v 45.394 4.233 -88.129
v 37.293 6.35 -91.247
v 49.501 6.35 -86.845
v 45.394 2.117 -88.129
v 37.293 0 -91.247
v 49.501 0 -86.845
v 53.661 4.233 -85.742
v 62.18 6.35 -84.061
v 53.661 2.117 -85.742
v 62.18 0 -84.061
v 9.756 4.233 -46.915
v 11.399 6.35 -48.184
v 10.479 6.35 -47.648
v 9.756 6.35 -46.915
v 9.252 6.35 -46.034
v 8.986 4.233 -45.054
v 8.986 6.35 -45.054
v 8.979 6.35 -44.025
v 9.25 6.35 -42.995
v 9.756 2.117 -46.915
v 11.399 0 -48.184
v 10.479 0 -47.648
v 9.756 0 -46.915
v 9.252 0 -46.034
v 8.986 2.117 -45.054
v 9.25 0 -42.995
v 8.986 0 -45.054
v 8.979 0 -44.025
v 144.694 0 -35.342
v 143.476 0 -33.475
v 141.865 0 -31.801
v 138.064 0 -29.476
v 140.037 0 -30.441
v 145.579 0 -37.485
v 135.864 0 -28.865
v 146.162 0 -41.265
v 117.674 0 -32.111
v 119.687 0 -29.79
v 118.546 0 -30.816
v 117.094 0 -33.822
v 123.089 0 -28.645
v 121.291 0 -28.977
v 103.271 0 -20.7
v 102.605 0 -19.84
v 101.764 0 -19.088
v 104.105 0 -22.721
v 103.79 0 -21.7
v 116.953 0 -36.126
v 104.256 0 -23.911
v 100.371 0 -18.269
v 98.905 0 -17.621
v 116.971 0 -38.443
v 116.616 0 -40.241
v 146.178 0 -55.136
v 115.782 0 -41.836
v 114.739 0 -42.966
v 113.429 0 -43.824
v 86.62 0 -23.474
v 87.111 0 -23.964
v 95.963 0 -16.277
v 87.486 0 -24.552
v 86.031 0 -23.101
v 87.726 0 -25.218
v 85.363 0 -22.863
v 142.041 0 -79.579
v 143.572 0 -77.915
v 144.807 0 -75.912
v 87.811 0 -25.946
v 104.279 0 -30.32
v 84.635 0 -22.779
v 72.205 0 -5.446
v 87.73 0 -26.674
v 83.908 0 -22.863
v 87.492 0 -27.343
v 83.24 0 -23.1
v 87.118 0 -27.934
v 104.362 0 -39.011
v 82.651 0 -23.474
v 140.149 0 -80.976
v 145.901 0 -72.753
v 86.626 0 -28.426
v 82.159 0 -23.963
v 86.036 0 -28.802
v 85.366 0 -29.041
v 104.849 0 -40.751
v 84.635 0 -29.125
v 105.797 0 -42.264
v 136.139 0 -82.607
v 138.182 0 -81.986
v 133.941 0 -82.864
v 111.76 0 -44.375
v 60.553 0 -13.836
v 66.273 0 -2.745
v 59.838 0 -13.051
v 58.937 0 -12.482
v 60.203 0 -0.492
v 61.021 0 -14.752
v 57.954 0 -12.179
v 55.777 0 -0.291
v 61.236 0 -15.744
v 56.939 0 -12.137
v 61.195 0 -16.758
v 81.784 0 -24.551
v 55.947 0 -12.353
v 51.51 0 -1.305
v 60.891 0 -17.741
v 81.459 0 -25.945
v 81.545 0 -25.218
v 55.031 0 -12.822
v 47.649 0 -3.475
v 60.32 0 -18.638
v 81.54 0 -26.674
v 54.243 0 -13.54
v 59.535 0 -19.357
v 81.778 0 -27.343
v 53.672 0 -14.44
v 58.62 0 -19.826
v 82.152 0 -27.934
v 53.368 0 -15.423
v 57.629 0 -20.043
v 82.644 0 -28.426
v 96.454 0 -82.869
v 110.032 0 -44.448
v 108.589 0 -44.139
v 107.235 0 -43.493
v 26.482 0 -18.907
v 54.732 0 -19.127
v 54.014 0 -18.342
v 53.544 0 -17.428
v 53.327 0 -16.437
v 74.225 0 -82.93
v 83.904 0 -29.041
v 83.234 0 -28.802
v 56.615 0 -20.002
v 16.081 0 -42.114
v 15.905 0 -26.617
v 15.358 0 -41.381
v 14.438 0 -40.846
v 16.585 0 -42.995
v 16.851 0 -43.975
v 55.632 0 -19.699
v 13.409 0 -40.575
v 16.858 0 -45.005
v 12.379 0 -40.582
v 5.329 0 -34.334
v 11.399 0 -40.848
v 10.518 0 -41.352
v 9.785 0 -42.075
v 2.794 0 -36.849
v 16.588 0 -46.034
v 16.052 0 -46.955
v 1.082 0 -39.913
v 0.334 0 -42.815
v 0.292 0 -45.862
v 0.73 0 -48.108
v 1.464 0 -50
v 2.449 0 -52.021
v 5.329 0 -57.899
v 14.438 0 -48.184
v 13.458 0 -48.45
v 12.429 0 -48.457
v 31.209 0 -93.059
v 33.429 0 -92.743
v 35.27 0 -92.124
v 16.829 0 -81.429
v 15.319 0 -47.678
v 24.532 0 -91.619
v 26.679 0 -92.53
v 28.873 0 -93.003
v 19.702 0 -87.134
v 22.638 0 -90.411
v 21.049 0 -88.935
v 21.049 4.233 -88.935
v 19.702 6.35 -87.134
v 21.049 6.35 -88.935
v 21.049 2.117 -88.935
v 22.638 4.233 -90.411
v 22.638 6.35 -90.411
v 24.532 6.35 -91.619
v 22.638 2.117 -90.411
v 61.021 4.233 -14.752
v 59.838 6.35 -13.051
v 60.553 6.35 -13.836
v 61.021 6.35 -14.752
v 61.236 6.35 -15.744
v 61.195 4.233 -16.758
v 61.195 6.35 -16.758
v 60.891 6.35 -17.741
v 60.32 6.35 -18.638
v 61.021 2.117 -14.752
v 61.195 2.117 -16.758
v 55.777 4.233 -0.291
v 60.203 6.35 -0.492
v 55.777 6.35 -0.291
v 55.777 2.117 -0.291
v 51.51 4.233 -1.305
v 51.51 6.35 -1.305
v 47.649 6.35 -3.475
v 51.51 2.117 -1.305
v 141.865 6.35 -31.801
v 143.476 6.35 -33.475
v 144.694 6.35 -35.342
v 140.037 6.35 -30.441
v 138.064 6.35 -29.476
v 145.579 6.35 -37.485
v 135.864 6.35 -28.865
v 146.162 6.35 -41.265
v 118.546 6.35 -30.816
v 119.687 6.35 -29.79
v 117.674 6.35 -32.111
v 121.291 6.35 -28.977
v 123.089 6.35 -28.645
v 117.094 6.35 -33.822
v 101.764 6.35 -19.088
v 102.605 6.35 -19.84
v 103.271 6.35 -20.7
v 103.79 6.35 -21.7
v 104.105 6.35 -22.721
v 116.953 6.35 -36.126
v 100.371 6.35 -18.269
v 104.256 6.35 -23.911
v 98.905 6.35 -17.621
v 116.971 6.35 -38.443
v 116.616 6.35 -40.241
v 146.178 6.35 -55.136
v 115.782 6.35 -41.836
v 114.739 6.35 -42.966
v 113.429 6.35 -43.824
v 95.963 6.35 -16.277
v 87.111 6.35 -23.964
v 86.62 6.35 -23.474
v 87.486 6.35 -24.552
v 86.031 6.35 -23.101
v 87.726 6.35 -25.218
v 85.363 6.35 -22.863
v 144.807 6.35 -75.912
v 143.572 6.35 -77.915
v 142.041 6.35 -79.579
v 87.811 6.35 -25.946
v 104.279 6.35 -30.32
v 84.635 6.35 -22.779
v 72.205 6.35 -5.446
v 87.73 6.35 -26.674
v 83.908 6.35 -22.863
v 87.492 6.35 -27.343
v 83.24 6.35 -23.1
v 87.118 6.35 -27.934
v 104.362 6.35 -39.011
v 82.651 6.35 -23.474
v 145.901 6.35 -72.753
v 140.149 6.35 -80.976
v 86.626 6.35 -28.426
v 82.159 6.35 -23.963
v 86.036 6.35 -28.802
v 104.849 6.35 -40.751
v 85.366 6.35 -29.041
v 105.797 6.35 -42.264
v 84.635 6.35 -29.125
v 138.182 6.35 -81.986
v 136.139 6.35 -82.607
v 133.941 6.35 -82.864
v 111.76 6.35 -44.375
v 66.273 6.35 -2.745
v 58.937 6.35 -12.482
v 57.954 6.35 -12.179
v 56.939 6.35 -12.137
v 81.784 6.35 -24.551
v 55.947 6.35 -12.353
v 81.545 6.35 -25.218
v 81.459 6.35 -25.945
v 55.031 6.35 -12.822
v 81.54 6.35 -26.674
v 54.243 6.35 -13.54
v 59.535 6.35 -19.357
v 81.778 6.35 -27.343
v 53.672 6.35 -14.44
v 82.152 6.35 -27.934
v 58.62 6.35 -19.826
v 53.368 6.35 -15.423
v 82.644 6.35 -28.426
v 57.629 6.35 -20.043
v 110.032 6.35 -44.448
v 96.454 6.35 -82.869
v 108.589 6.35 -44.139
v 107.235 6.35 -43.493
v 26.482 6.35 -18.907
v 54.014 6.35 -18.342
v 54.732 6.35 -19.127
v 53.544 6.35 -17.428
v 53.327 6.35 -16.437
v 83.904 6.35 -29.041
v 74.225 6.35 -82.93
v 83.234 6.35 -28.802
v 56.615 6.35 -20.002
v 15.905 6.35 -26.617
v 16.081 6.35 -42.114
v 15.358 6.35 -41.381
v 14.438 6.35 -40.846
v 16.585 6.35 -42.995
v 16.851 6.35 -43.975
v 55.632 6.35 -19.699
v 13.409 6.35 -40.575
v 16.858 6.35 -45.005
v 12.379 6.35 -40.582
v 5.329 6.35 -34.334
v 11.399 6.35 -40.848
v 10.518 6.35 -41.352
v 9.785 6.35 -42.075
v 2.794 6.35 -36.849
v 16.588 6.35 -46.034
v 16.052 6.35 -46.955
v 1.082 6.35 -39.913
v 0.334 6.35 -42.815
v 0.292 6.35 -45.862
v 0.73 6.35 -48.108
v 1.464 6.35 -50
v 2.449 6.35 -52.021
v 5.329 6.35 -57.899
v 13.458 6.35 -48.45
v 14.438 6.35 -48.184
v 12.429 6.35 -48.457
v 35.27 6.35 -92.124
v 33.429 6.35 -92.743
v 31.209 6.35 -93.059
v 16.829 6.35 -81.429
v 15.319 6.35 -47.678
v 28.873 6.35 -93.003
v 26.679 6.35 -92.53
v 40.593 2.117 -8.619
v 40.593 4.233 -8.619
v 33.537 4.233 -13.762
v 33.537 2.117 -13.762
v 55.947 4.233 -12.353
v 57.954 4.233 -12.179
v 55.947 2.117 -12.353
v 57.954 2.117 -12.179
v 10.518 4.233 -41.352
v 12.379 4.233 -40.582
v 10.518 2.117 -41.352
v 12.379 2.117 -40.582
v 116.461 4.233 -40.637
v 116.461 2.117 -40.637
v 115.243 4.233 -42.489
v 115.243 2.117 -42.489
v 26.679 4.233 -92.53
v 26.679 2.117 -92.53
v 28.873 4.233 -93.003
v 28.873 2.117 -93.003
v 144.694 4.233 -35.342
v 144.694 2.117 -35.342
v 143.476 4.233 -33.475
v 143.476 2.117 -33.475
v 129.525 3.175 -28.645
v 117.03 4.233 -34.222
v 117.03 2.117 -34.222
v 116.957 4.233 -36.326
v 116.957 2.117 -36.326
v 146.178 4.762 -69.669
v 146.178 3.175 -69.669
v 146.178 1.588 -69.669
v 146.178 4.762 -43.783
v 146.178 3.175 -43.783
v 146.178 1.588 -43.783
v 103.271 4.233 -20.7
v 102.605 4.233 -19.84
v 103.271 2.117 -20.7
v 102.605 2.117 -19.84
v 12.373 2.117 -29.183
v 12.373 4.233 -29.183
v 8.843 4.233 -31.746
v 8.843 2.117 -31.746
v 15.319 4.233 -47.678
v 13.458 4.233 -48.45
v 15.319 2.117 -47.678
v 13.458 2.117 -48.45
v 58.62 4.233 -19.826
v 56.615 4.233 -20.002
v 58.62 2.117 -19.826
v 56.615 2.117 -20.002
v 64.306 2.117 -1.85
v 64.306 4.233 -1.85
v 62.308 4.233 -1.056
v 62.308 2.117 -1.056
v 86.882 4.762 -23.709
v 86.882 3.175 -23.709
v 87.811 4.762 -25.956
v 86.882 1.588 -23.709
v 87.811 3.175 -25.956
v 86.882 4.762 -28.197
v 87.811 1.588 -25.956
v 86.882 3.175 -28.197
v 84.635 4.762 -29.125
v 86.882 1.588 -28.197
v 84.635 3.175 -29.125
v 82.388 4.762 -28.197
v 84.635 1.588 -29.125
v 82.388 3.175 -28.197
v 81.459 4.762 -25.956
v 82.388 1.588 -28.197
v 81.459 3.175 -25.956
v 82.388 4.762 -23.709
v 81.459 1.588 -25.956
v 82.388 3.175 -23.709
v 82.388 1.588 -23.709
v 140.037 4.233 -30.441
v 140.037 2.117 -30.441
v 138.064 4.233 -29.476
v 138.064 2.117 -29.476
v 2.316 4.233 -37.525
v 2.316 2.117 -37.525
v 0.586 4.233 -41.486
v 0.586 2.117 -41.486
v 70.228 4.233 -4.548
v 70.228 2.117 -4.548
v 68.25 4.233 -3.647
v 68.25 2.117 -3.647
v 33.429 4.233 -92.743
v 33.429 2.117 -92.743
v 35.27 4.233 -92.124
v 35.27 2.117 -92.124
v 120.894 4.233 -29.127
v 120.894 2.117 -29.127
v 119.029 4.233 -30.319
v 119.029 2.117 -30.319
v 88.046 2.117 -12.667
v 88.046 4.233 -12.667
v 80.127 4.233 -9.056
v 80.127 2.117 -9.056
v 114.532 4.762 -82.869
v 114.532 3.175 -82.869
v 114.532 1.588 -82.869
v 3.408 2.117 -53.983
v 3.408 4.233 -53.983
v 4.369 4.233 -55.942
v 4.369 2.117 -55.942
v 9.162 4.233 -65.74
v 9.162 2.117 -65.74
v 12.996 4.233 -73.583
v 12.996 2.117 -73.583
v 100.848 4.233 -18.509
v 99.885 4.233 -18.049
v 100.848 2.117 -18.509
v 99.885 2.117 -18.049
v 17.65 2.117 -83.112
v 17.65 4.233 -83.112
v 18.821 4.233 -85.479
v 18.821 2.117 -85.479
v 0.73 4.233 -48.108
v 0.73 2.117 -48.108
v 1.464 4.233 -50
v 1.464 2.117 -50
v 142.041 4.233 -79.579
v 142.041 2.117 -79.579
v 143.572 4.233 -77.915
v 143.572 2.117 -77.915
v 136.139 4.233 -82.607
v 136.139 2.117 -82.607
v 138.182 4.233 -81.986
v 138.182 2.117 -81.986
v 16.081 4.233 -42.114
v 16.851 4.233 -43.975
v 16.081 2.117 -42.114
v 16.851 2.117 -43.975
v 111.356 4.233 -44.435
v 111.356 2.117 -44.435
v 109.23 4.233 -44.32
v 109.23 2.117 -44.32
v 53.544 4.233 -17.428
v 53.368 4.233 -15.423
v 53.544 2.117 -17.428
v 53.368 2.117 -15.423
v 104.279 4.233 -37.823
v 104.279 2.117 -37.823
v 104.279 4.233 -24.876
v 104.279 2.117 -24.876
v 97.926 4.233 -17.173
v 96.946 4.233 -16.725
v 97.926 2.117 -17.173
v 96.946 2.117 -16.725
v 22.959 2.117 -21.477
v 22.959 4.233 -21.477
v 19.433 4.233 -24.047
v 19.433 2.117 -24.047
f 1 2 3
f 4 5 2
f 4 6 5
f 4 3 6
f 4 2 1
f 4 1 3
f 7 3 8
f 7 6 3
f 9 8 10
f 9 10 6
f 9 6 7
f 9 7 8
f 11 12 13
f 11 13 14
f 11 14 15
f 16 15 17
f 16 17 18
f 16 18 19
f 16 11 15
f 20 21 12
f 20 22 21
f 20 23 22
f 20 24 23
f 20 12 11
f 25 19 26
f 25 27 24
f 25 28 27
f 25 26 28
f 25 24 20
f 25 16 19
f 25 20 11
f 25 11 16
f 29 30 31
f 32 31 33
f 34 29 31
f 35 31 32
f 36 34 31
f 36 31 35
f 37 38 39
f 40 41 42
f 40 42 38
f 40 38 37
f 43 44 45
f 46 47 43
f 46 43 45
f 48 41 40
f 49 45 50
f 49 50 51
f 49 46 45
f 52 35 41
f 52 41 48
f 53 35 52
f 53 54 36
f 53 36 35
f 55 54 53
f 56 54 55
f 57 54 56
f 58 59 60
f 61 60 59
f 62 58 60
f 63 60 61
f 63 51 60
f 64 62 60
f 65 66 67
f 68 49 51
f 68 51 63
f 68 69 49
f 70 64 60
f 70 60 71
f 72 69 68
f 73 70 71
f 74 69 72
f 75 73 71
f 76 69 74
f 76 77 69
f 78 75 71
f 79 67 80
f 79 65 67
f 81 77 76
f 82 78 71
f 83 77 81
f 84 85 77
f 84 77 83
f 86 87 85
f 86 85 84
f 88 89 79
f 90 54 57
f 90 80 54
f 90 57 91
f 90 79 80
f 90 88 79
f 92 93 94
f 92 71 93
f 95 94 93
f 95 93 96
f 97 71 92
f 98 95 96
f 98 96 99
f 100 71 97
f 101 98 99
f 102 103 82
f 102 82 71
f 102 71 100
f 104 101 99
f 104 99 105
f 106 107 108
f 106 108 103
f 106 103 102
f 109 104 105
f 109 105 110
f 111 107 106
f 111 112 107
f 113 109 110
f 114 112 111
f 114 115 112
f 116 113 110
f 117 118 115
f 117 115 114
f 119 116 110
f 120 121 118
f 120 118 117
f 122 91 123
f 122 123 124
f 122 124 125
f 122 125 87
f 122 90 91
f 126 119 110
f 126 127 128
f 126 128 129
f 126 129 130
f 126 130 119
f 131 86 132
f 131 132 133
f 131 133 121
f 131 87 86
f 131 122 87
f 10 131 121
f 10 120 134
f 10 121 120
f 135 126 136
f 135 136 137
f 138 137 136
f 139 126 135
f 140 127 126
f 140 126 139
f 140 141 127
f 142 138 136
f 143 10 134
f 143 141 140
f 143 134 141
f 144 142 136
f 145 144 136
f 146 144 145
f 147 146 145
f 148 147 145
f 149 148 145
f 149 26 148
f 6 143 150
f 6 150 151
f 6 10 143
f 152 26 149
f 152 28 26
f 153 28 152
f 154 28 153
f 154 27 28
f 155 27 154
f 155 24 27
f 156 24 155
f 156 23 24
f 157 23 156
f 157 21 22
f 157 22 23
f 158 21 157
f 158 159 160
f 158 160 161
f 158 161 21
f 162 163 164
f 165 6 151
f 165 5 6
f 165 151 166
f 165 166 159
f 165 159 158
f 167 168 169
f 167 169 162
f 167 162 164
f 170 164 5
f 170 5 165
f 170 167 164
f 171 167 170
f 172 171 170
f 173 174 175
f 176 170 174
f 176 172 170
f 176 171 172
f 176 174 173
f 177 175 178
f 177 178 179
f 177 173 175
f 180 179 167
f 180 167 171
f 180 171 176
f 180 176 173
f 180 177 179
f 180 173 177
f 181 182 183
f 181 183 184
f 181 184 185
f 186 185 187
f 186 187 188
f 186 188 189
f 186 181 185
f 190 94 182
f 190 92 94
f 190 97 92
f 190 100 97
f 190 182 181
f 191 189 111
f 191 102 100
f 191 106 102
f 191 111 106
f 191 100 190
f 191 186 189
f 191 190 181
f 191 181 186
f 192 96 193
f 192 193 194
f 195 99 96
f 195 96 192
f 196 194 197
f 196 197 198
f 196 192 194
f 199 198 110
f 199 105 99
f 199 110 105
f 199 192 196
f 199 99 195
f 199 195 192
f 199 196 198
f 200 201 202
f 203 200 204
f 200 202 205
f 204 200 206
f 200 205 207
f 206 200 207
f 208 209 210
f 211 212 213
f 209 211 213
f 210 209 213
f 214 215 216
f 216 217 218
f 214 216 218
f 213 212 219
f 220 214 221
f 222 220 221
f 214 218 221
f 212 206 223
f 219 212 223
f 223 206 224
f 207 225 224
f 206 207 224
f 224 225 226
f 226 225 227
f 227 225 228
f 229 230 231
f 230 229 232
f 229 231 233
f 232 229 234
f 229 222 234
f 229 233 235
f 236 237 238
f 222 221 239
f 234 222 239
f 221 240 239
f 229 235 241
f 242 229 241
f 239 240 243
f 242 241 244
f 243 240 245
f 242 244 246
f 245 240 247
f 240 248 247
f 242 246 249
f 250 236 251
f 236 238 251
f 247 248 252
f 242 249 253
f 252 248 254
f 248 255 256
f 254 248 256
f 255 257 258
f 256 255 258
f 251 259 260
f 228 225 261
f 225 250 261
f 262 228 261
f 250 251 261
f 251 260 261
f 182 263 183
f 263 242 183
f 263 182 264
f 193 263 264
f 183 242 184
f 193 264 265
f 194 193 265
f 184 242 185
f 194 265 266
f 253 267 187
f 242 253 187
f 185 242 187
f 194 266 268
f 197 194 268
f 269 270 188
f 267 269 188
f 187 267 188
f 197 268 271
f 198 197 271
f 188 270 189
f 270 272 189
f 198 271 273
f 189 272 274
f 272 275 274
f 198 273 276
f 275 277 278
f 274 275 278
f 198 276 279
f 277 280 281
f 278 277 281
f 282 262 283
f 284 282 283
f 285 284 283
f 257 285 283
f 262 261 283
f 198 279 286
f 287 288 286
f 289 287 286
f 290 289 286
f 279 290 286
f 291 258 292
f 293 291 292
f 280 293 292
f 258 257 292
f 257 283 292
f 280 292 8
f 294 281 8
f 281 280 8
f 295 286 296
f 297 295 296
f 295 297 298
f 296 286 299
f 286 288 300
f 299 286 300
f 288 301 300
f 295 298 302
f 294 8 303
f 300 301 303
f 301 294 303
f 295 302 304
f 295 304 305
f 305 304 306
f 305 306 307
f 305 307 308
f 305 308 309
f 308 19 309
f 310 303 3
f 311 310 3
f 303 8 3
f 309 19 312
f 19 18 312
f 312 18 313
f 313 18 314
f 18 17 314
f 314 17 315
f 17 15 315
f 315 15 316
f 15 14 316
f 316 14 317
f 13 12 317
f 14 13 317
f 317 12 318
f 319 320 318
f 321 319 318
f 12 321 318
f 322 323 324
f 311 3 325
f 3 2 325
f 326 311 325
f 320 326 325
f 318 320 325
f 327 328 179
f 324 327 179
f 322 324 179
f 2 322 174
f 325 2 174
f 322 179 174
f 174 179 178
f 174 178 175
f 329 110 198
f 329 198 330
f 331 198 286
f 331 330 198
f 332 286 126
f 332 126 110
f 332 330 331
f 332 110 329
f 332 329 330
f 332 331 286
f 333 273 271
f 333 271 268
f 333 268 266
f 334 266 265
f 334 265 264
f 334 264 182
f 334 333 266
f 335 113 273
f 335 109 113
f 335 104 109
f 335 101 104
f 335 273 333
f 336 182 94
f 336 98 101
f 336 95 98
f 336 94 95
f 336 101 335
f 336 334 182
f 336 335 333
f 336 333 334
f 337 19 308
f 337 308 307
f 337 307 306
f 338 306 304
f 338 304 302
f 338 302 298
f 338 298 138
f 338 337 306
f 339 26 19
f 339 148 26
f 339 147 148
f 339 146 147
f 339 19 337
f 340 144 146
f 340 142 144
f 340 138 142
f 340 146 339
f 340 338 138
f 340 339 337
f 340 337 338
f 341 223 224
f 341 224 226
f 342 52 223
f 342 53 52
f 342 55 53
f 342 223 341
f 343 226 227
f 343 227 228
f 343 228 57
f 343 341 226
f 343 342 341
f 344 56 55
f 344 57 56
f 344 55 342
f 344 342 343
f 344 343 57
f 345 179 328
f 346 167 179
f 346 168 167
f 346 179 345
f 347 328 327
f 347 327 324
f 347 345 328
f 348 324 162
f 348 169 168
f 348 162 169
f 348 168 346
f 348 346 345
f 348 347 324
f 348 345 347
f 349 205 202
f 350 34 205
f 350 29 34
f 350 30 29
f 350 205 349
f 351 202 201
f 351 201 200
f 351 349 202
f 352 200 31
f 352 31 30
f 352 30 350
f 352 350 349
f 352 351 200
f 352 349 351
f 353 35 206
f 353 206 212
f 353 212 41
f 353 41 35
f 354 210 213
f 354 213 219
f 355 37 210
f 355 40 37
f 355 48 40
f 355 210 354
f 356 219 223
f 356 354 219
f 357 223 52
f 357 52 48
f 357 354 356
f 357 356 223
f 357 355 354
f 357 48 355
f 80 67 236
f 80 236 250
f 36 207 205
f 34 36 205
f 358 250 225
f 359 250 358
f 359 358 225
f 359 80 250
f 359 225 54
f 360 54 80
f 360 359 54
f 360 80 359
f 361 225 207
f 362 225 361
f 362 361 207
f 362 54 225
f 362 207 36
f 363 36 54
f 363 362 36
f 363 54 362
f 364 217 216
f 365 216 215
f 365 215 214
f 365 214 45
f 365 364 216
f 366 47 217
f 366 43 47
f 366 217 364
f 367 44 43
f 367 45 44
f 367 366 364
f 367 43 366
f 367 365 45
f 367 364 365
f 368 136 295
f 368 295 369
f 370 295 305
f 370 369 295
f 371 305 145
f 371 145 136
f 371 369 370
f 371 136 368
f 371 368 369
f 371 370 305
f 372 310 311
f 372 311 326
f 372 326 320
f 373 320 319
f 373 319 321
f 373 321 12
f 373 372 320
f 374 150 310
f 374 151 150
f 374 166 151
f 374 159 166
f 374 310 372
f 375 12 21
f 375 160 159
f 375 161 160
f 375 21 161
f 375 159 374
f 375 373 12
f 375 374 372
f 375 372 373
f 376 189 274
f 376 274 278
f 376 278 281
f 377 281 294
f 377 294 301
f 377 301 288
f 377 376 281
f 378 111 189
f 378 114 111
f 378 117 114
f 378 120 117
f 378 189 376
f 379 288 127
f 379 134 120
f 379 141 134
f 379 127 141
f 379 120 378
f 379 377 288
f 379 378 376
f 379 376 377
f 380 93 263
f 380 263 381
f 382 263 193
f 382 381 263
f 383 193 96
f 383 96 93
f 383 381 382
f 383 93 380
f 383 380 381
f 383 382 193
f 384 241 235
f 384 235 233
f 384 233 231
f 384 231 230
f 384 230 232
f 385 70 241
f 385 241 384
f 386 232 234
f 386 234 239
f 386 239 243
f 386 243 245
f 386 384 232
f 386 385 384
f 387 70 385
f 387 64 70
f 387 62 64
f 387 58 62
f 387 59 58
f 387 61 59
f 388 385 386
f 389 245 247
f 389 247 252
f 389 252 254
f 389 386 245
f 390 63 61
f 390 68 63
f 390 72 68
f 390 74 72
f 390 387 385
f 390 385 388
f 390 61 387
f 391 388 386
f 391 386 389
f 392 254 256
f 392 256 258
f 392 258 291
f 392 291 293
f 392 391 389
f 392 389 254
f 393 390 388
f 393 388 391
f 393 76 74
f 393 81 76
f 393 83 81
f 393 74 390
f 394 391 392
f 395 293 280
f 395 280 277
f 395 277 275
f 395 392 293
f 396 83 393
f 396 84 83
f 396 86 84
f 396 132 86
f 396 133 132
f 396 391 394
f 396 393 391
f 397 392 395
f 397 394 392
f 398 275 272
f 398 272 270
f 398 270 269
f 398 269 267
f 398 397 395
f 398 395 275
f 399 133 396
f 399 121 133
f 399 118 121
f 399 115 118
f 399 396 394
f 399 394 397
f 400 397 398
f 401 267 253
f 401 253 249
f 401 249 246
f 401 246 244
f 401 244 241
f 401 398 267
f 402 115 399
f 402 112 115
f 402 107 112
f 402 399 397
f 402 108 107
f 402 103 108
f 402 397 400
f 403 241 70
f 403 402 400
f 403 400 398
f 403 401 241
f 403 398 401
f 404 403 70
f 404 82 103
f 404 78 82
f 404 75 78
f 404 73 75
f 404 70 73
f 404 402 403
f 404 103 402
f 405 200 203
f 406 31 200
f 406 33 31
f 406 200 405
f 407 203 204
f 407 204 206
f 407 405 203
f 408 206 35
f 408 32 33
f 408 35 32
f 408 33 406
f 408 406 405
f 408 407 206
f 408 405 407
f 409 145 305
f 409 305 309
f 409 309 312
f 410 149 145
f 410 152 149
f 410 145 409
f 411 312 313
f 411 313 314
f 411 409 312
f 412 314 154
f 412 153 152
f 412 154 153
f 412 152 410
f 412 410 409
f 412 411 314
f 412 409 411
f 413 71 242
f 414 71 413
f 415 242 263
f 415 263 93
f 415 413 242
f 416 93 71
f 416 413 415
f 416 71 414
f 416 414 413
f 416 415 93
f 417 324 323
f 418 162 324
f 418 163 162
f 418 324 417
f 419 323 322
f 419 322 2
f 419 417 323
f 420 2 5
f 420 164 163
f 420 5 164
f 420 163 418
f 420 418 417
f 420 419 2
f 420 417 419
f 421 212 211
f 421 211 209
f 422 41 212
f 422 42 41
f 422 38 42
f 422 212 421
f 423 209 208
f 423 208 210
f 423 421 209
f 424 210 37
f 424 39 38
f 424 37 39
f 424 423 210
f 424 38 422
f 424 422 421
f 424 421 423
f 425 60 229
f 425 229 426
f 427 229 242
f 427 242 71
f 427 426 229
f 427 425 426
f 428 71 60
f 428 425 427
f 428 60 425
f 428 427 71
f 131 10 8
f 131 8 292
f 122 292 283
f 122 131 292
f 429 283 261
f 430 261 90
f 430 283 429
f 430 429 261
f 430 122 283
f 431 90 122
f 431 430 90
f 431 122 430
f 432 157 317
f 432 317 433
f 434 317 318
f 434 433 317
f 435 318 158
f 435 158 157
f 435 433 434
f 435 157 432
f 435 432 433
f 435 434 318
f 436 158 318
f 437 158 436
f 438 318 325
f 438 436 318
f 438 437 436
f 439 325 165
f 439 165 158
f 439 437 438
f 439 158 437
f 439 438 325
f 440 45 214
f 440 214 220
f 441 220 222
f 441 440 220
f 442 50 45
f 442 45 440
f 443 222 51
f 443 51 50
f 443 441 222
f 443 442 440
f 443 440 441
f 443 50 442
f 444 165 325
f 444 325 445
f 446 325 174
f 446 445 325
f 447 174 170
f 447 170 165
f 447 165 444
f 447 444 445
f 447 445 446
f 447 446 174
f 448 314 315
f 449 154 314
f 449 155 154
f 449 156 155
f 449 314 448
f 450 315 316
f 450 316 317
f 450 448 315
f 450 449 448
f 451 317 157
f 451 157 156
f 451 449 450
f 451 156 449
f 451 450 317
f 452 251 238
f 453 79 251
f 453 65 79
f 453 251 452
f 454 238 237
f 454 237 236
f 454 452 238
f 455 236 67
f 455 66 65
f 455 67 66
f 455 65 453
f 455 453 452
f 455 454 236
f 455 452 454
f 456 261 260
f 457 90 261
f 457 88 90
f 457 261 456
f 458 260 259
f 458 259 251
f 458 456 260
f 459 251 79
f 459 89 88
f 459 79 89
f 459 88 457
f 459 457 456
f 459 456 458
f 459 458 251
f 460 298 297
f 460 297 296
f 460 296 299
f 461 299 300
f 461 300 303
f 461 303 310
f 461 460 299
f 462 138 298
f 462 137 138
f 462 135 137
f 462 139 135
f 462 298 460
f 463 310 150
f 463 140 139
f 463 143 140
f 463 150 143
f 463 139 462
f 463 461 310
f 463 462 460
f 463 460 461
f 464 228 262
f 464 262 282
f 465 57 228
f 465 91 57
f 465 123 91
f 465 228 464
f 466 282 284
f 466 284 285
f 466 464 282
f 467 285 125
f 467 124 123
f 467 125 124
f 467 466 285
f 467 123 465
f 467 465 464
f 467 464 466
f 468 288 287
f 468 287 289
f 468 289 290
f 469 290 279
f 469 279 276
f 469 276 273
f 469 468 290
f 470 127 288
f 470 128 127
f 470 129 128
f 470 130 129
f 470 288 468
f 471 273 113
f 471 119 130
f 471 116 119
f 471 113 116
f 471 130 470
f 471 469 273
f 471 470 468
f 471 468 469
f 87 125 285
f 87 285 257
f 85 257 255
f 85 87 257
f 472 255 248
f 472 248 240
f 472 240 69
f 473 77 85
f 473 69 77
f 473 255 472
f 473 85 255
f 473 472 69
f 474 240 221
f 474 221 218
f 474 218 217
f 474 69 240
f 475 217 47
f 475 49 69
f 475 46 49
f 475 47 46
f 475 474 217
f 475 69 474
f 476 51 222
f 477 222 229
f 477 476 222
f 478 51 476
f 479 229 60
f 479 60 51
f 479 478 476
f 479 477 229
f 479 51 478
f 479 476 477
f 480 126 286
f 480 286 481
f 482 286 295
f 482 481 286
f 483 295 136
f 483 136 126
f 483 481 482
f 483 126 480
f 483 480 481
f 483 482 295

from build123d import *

# Parameters (mm, degrees)
BOSS_EXTRUDE1_DEPTH = 6.35


with BuildPart() as part:
    # Imported Profile → Boss-Extrude1 (new body)
    with BuildSketch(Plane(origin=(0, 0, 0), x_dir=(1, 0, 0), z_dir=(0, 1, 0))):
        with BuildLine():
            add(Edge.make_bspline(
                [(47.6487744, 3.4752534), (40.59301, 8.6201504), (33.5374742, 13.7602468), (26.4818876, 18.9072012)],
                knots=[0, 0, 0, 0, 1, 1, 1, 1], degree=3))
            add(Edge.make_bspline(
                [(26.4818876, 18.9072012), (22.9609904, 21.4772494), (19.4332098, 24.0472976), (15.9054292, 26.6173458)],
                knots=[0, 0, 0, 0, 1, 1, 1, 1], degree=3))
            add(Edge.make_bspline(
                [(15.9054292, 26.6173458), (12.3776486, 29.194252), (8.8292178, 31.722949), (5.3289962, 34.3343484)],
                knots=[0, 0, 0, 0, 1, 1, 1, 1], degree=3))
            add(Edge.make_bspline(
                [(5.3289962, 34.3343484), (1.725422, 37.0214906), (-0.1831594, 41.396793), (0.2922778, 45.8616304)],
                knots=[0, 0, 0, 0, 1, 1, 1, 1], degree=3))
            add(Edge.make_bspline(
                [(0.2922778, 45.8616304), (0.5678678, 48.4454454), (1.3533628, 49.775237), (2.4489156, 52.0214352)],
                knots=[0, 0, 0, 0, 1, 1, 1, 1], degree=3))
            add(Edge.make_bspline(
                [(2.4489156, 52.0214352), (3.406648, 53.9851346), (4.3712638, 55.9420014), (5.3289962, 57.898792)],
                knots=[0, 0, 0, 0, 1, 1, 1, 1], degree=3))
            add(Edge.make_bspline(
                [(5.3289962, 57.898792), (9.1599258, 65.7398482), (12.9977896, 73.5809044), (16.8287192, 81.4287932)],
                knots=[0, 0, 0, 0, 1, 1, 1, 1], degree=3))
            add(Edge.make_bspline(
                [(16.8287192, 81.4287932), (17.2627798, 82.3038486), (19.17827, 86.3001322), (19.7019418, 87.1338872)],
                knots=[0, 0, 0, 0, 1, 1, 1, 1], degree=3))
            add(Edge.make_bspline(
                [(19.7019418, 87.1338872), (20.9490564, 89.1182368), (22.464903, 90.5238474), (24.531955, 91.6194002)],
                knots=[0, 0, 0, 0, 1, 1, 1, 1], degree=3))
            add(Edge.make_bspline(
                [(24.531955, 91.6194002), (26.6885928, 92.7563042), (28.769437, 93.2041316), (31.2085736, 93.0594532)],
                knots=[0, 0, 0, 0, 1, 1, 1, 1], degree=3))
            add(Edge.make_bspline(
                [(31.2085736, 93.0594532), (33.8061554, 92.9079422), (34.9912686, 92.2394904), (37.2925594, 91.2472902)],
                knots=[0, 0, 0, 0, 1, 1, 1, 1], degree=3))
            add(Edge.make_bspline(
                [(37.2925594, 91.2472902), (45.3403208, 87.7540028), (53.505227, 85.3975432), (62.179962, 84.0608428)],
                knots=[0, 0, 0, 0, 1, 1, 1, 1], degree=3))
            add(Edge.make_bspline(
                [(62.179962, 84.0608428), (71.9502752, 82.5518796), (78.5372572, 82.8688462), (88.3282714, 82.8688462)],
                knots=[0, 0, 0, 0, 1, 1, 1, 1], degree=3))
            add(Edge.make_bspline(
                [(88.3282714, 82.8688462), (97.0650078, 82.8688462), (105.8017696, 82.8688462), (114.5316734, 82.8688462)],
                knots=[0, 0, 0, 0, 1, 1, 1, 1], degree=3))
            add(Edge.make_bspline(
                [(114.5316734, 82.8688462), (118.8517562, 82.8688462), (123.1719152, 82.8688462), (127.4989576, 82.8688462)],
                knots=[0, 0, 0, 0, 1, 1, 1, 1], degree=3))
            add(Edge.make_bspline(
                [(127.4989576, 82.8688462), (129.648712, 82.8688462), (131.7984664, 82.9378326), (133.941312, 82.8638424)],
                knots=[0, 0, 0, 0, 1, 1, 1, 1], degree=3))
            add(Edge.make_bspline(
                [(133.941312, 82.8638424), (136.2426282, 82.7813432), (138.1925608, 82.1885834), (140.1493768, 80.9758858)],
                knots=[0, 0, 0, 0, 1, 1, 1, 1], degree=3))
            add(Edge.make_bspline(
                [(140.1493768, 80.9758858), (142.2439624, 79.6874454), (143.6978076, 78.1095974), (144.8071272, 75.9116338)],
                knots=[0, 0, 0, 0, 1, 1, 1, 1], degree=3))
            add(Edge.make_bspline(
                [(144.8071272, 75.9116338), (145.8337698, 73.892791), (146.17827, 71.8946492), (146.17827, 69.669152)],
                knots=[0, 0, 0, 0, 1, 1, 1, 1], degree=3))
            add(Edge.make_bspline(
                [(146.17827, 69.669152), (146.17827, 65.3489422), (146.17827, 61.0219506), (146.17827, 56.7017408)],
                knots=[0, 0, 0, 0, 1, 1, 1, 1], degree=3))
            add(Edge.make_bspline(
                [(146.17827, 56.7017408), (146.17827, 52.3953994), (146.17827, 48.0890326), (146.17827, 43.7826912)],
                knots=[0, 0, 0, 0, 1, 1, 1, 1], degree=3))
            add(Edge.make_bspline(
                [(146.17827, 43.7826912), (146.17827, 41.653587), (146.2542668, 39.586535), (145.5788046, 37.4850406)],
                knots=[0, 0, 0, 0, 1, 1, 1, 1], degree=3))
            add(Edge.make_bspline(
                [(145.5788046, 37.4850406), (144.8415696, 35.176841), (143.6909242, 33.4060546), (141.8650198, 31.8006476)],
                knots=[0, 0, 0, 0, 1, 1, 1, 1], degree=3))
            add(Edge.make_bspline(
                [(141.8650198, 31.8006476), (140.0804666, 30.2296322), (138.2063276, 29.313251), (135.8636602, 28.8653982)],
                knots=[0, 0, 0, 0, 1, 1, 1, 1], degree=3))
            add(Edge.make_bspline(
                [(135.8636602, 28.8653982), (134.2513698, 28.5624016), (131.137025, 28.6449008), (129.5247092, 28.6449008)],
                knots=[0, 0, 0, 0, 1, 1, 1, 1], degree=3))
            add(Edge.make_bspline(
                [(129.5247092, 28.6449008), (127.3818128, 28.6449008), (125.2321092, 28.5624016), (123.0892636, 28.6449008)],
                knots=[0, 0, 0, 0, 1, 1, 1, 1], degree=3))
            add(Edge.make_bspline(
                [(123.0892636, 28.6449008), (120.787922, 28.734385), (118.7139612, 30.0573948), (117.6735772, 32.11068)],
                knots=[0, 0, 0, 0, 1, 1, 1, 1], degree=3))
            add(Edge.make_bspline(
                [(117.6735772, 32.11068), (116.5849078, 34.23285), (117.0741118, 36.3136942), (116.9707592, 38.4427476)],
                knots=[0, 0, 0, 0, 1, 1, 1, 1], degree=3))
            add(Edge.make_bspline(
                [(116.9707592, 38.4427476), (116.8537668, 40.750998), (115.5031726, 42.8042324), (113.4292118, 43.8239916)],
                knots=[0, 0, 0, 0, 1, 1, 1, 1], degree=3))
            add(Edge.make_bspline(
                [(113.4292118, 43.8239916), (111.4448114, 44.8023996), (109.1021694, 44.671488), (107.2349138, 43.4934868)],
                knots=[0, 0, 0, 0, 1, 1, 1, 1], degree=3))
            add(Edge.make_bspline(
                [(107.2349138, 43.4934868), (105.188512, 42.1981376), (104.2790142, 40.1655026), (104.2790142, 37.8228352)],
                knots=[0, 0, 0, 0, 1, 1, 1, 1], degree=3))
            add(Edge.make_bspline(
                [(104.2790142, 37.8228352), (104.2790142, 33.509585), (104.2790142, 29.1963348), (104.2790142, 24.8762012)],
                knots=[0, 0, 0, 0, 1, 1, 1, 1], degree=3))
            add(Edge.make_bspline(
                [(104.2790142, 24.8762012), (104.2790142, 23.7806484), (104.2240232, 22.747097), (103.7900134, 21.6998042)],
                knots=[0, 0, 0, 0, 1, 1, 1, 1], degree=3))
            add(Edge.make_bspline(
                [(103.7900134, 21.6998042), (103.3350232, 20.6180436), (102.7013694, 19.7980808), (101.7643126, 19.0884302)],
                knots=[0, 0, 0, 0, 1, 1, 1, 1], degree=3))
            add(Edge.make_bspline(
                [(101.7643126, 19.0884302), (100.8823738, 18.42008), (99.8833156, 18.0617876), (98.9048568, 17.6207928)],
                knots=[0, 0, 0, 0, 1, 1, 1, 1], degree=3))
            add(Edge.make_bspline(
                [(98.9048568, 17.6207928), (97.9264742, 17.1727876), (96.9480662, 16.7250872), (95.9627748, 16.2772344)],
                knots=[0, 0, 0, 0, 1, 1, 1, 1], degree=3))
            add(Edge.make_bspline(
                [(95.9627748, 16.2772344), (88.0459758, 12.6667514), (80.129126, 9.0562938), (72.2053674, 5.4458362)],
                knots=[0, 0, 0, 0, 1, 1, 1, 1], degree=3))
            add(Edge.make_bspline(
                [(72.2053674, 5.4458362), (70.2279266, 4.5501306), (68.2504096, 3.6474908), (66.272918, 2.7449018)],
                knots=[0, 0, 0, 0, 1, 1, 1, 1], degree=3))
            add(Edge.make_bspline(
                [(66.272918, 2.7449018), (64.2954772, 1.8422874), (62.3868704, 0.8983472), (60.2026736, 0.4917948)],
                knots=[0, 0, 0, 0, 1, 1, 1, 1], degree=3))
            add(Edge.make_bspline(
                [(60.2026736, 0.4917948), (55.779162, -0.3350006), (51.2247642, 0.7467854), (47.6487744, 3.4752534)],
                knots=[0, 0, 0, 0, 1, 1, 1, 1], degree=3))
        make_face()
        with BuildLine():
            add(Edge.make_bspline(
                [(87.8114576, 25.9559044), (87.8114576, 27.7059898), (86.3921056, 29.1253418), (84.6351114, 29.1253418)],
                knots=[0, 0, 0, 0, 1, 1, 1, 1], degree=3))
            add(Edge.make_bspline(
                [(84.6351114, 29.1253418), (82.8781172, 29.1253418), (81.4587144, 27.7059898), (81.4587144, 25.9559044)],
                knots=[0, 0, 0, 0, 1, 1, 1, 1], degree=3))
            add(Edge.make_bspline(
                [(81.4587144, 25.9559044), (81.4587144, 24.198834), (82.8781172, 22.779482), (84.6351114, 22.779482)],
                knots=[0, 0, 0, 0, 1, 1, 1, 1], degree=3))
            add(Edge.make_bspline(
                [(84.6351114, 22.779482), (86.3921056, 22.779482), (87.8114576, 24.198834), (87.8114576, 25.9559044)],
                knots=[0, 0, 0, 0, 1, 1, 1, 1], degree=3))
        make_face(mode=Mode.SUBTRACT)
        with BuildLine():
            add(Edge.make_bspline(
                [(16.5875716, 46.0338932), (15.7469586, 48.059594), (13.4249668, 49.0242352), (11.399266, 48.1836476)],
                knots=[0, 0, 0, 0, 1, 1, 1, 1], degree=3))
            add(Edge.make_bspline(
                [(11.399266, 48.1836476), (9.3735398, 47.3430346), (8.4158074, 45.0210428), (9.249537, 42.9952912)],
                knots=[0, 0, 0, 0, 1, 1, 1, 1], degree=3))
            add(Edge.make_bspline(
                [(9.249537, 42.9952912), (10.0901246, 40.9695904), (12.4121164, 40.0118326), (14.4378172, 40.8455368)],
                knots=[0, 0, 0, 0, 1, 1, 1, 1], degree=3))
            add(Edge.make_bspline(
                [(14.4378172, 40.8455368), (16.4635434, 41.6862006), (17.4212758, 44.0081416), (16.5875716, 46.0338932)],
                knots=[0, 0, 0, 0, 1, 1, 1, 1], degree=3))
        make_face(mode=Mode.SUBTRACT)
        with BuildLine():
            add(Edge.make_bspline(
                [(60.3200216, 18.6384946), (58.9140046, 20.3196952), (56.4128666, 20.5401926), (54.731666, 19.1274954)],
                knots=[0, 0, 0, 0, 1, 1, 1, 1], degree=3))
            add(Edge.make_bspline(
                [(54.731666, 19.1274954), (53.0504654, 17.7218848), (52.829968, 15.2207468), (54.2426652, 13.5395462)],
                knots=[0, 0, 0, 0, 1, 1, 1, 1], degree=3))
            add(Edge.make_bspline(
                [(54.2426652, 13.5395462), (55.6551592, 11.8583456), (58.1563226, 11.6447316), (59.8375232, 13.0505454)],
                knots=[0, 0, 0, 0, 1, 1, 1, 1], degree=3))
            add(Edge.make_bspline(
                [(59.8375232, 13.0505454), (61.511815, 14.4561306), (61.7323124, 16.964152), (60.3200216, 18.6384946)],
                knots=[0, 0, 0, 0, 1, 1, 1, 1], degree=3))
        make_face(mode=Mode.SUBTRACT)
    extrude(amount=BOSS_EXTRUDE1_DEPTH)


solid = part.part
